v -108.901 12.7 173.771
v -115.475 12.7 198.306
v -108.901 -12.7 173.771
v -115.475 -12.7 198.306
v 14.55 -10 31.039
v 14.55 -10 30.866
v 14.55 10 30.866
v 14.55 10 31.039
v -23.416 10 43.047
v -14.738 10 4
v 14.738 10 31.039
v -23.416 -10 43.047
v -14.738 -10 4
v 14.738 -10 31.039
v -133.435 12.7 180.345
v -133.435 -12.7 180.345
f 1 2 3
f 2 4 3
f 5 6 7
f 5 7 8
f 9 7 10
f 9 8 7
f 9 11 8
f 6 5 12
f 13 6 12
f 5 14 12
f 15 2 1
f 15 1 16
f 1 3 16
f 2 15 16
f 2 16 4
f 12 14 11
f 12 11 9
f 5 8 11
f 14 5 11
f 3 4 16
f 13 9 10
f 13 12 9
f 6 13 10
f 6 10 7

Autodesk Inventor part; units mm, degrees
ref_plane "YZ Plane" through (0, 0, 0) normal (1, 0, 0) x (0, 1, 0)
ref_plane "XZ Plane" through (0, 0, 0) normal (0, 1, 0) x (-1, 0, 0)
ref_plane "XY Plane" through (0, 0, 0) normal (0, 0, 1) x (1, 0, 0)
sketch "PENTAPRISMA" plane through (0, 0, 0) normal (0, 0, 1) x (1, 0, 0)
  line L0 (-36.8404, 92.0637) -> (-26.2338, 81.4571)
  line L1 (-26.2338, 81.4571) -> (-15.6272, 92.0637)
  line L2 (-15.6272, 92.0637) -> (-20.5273, 103.8937)
  line L3 (-20.5273, 103.8937) -> (-31.9403, 103.8937)
  line L4 (-31.9403, 103.8937) -> (-36.8404, 92.0637)
  line L5 (-20.9305, 86.7604) -> (-26.2338, 92.0637) construction
  line L6 (-26.2338, 92.0637) -> (-31.5371, 86.7604) construction
  line L7 (-26.2338, 81.4571) -> (-26.2338, 103.8937) construction
  dimension "d114" = 90
  dimension "d115" = 112.5
  dimension "d116" = 112.5
  dimension "d117" = 112.5
  dimension "d118" = 15
sketch "PRISMA.ENTRADA" plane through (0, 0, 0) normal (0, 0, 1) x (1, 0, 0)
  line L0 (57.6201, 1.807) -> (40.3499, 20.4323)
  line L1 (40.3499, 20.4323) -> (32.8551, -3.8368)
  line L2 (32.8551, -3.8368) -> (57.6201, 1.807)
  line L3 (45.2376, -1.0149) -> (46.3486, -5.8899) construction
  line L4 (45.2376, -1.0149) -> (62.1685, -11.6611)
  line L5 (45.2376, -1.0149) -> (37.1097, 9.9401) construction
  line L6 (45.2376, -1.0149) -> (36.8424, 9.0746) construction
  line L7 (37.1097, 9.9401) -> (31.8295, 29.2305)
  line L8 (36.8424, 9.0746) -> (29.4513, 27.6587)
  line L9 (45.2376, -1.0149) -> (35.5983, 5.0463) construction
  point P0 (40.854, 14.8365)
  dimension "d132" = 5
  dimension "d133" = 25.4
  dimension "d134" = 20
  dimension "d135" = 45
  dimension "d136" = 20
  dimension "d137" = 20
  dimension "d140" = 42.53
  dimension "d141" = 36.15
  dimension "d142" = 18.075
  dimension "d143" = 21.265
sketch "OTICA" plane through (0, 0, 0) normal (0, 1, 0) x (-1, 0, 0)
  line L0 (23.4165, 43.0473) -> (14.7385, 4)
  line L1 (14.7385, 4) -> (-14.7385, 31.039)
  line L2 (-14.7385, 31.039) -> (23.4165, 43.0473)
  line L3 (7.0299, 37.8901) -> (22.401, 42.7277) construction
  line L4 (101.5992, 157.0905) -> (-13.7385, 31.3538)
  line L5 (101.6654, 151.2273) -> (22.401, 42.7277)
  line L6 (14.55, 0) -> (-14.55, 0)
  line L7 (-13.7385, 31.3538) -> (-14.3522, 30.6847) construction
  line L8 (22.401, 42.7277) -> (2.3861, 15.3307) construction
  line L9 (22.401, 42.7277) -> (10.9082, 7.5135)
  line L10 (10.9082, 7.5135) -> (10.9082, 0)
  line L11 (-13.7385, 31.3538) -> (-14.0918, 30.4459)
  line L12 (-14.0918, 30.4459) -> (-14.0918, 0)
  line L13 (14.55, 0) -> (14.55, 4)
  line L14 (14.55, 4) -> (14.7385, 4)
  line L15 (-14.55, 0) -> (-14.55, 31.039)
  line L16 (-14.55, 31.039) -> (-14.7385, 31.039)
  line L17 (14.55, 0) -> (55.2636, 0)
  line L18 (115.4746, 198.3059) -> (108.9006, 173.7714)
  line L19 (108.9006, 173.7714) -> (133.4351, 180.3454)
  line L20 (133.4351, 180.3454) -> (115.4746, 198.3059)
  line L21 (124.4548, 189.3256) -> (127.9904, 192.8612) construction
  line L22 (124.4548, 189.3256) -> (124.4548, 209.3256)
  line L23 (124.4548, 189.3256) -> (119.5075, 176.6135) construction
  line L24 (124.4548, 189.3256) -> (120.3825, 176.8479) construction
  line L25 (119.5075, 176.6135) -> (105.988, 161.875)
  line L26 (120.3825, 176.8479) -> (108.5845, 160.6984)
  line L27 (124.4548, 189.3256) -> (124.4548, 177.9391) construction
  point P0 (0, 0)
  point P1 (0, 0)
  point P2 (0, 0)
  point P3 (-14.55, 30.8662)
  dimension "d1" = 40
  dimension "d188" = 29.1
  dimension "d189" = 36.15
  dimension "d190" = 42.53
  dimension "d191" = 21.265
  dimension "d192" = 18.075
  dimension "d197" = 4
  dimension "d205" = 1
  dimension "d208" = 25
  dimension "d209" = 0.4582
  dimension "d210" = 3.6418
  dimension "d211" = 1.0155
  dimension "d212" = 0.6467
  dimension "d213" = 3.8303
extrude "Extrusion20" add sketch "OTICA" along normal mid plane 25.4 contours L20 L19 L18
extrude "Extrusion21" add sketch "OTICA" along normal mid plane 20 contours L0 L1 L9 L2 | L9 L1 L11 L2 | L11 L1 L15 L16 L2
properties part number "PrismsGeometry" material "Nylon 6/6"
